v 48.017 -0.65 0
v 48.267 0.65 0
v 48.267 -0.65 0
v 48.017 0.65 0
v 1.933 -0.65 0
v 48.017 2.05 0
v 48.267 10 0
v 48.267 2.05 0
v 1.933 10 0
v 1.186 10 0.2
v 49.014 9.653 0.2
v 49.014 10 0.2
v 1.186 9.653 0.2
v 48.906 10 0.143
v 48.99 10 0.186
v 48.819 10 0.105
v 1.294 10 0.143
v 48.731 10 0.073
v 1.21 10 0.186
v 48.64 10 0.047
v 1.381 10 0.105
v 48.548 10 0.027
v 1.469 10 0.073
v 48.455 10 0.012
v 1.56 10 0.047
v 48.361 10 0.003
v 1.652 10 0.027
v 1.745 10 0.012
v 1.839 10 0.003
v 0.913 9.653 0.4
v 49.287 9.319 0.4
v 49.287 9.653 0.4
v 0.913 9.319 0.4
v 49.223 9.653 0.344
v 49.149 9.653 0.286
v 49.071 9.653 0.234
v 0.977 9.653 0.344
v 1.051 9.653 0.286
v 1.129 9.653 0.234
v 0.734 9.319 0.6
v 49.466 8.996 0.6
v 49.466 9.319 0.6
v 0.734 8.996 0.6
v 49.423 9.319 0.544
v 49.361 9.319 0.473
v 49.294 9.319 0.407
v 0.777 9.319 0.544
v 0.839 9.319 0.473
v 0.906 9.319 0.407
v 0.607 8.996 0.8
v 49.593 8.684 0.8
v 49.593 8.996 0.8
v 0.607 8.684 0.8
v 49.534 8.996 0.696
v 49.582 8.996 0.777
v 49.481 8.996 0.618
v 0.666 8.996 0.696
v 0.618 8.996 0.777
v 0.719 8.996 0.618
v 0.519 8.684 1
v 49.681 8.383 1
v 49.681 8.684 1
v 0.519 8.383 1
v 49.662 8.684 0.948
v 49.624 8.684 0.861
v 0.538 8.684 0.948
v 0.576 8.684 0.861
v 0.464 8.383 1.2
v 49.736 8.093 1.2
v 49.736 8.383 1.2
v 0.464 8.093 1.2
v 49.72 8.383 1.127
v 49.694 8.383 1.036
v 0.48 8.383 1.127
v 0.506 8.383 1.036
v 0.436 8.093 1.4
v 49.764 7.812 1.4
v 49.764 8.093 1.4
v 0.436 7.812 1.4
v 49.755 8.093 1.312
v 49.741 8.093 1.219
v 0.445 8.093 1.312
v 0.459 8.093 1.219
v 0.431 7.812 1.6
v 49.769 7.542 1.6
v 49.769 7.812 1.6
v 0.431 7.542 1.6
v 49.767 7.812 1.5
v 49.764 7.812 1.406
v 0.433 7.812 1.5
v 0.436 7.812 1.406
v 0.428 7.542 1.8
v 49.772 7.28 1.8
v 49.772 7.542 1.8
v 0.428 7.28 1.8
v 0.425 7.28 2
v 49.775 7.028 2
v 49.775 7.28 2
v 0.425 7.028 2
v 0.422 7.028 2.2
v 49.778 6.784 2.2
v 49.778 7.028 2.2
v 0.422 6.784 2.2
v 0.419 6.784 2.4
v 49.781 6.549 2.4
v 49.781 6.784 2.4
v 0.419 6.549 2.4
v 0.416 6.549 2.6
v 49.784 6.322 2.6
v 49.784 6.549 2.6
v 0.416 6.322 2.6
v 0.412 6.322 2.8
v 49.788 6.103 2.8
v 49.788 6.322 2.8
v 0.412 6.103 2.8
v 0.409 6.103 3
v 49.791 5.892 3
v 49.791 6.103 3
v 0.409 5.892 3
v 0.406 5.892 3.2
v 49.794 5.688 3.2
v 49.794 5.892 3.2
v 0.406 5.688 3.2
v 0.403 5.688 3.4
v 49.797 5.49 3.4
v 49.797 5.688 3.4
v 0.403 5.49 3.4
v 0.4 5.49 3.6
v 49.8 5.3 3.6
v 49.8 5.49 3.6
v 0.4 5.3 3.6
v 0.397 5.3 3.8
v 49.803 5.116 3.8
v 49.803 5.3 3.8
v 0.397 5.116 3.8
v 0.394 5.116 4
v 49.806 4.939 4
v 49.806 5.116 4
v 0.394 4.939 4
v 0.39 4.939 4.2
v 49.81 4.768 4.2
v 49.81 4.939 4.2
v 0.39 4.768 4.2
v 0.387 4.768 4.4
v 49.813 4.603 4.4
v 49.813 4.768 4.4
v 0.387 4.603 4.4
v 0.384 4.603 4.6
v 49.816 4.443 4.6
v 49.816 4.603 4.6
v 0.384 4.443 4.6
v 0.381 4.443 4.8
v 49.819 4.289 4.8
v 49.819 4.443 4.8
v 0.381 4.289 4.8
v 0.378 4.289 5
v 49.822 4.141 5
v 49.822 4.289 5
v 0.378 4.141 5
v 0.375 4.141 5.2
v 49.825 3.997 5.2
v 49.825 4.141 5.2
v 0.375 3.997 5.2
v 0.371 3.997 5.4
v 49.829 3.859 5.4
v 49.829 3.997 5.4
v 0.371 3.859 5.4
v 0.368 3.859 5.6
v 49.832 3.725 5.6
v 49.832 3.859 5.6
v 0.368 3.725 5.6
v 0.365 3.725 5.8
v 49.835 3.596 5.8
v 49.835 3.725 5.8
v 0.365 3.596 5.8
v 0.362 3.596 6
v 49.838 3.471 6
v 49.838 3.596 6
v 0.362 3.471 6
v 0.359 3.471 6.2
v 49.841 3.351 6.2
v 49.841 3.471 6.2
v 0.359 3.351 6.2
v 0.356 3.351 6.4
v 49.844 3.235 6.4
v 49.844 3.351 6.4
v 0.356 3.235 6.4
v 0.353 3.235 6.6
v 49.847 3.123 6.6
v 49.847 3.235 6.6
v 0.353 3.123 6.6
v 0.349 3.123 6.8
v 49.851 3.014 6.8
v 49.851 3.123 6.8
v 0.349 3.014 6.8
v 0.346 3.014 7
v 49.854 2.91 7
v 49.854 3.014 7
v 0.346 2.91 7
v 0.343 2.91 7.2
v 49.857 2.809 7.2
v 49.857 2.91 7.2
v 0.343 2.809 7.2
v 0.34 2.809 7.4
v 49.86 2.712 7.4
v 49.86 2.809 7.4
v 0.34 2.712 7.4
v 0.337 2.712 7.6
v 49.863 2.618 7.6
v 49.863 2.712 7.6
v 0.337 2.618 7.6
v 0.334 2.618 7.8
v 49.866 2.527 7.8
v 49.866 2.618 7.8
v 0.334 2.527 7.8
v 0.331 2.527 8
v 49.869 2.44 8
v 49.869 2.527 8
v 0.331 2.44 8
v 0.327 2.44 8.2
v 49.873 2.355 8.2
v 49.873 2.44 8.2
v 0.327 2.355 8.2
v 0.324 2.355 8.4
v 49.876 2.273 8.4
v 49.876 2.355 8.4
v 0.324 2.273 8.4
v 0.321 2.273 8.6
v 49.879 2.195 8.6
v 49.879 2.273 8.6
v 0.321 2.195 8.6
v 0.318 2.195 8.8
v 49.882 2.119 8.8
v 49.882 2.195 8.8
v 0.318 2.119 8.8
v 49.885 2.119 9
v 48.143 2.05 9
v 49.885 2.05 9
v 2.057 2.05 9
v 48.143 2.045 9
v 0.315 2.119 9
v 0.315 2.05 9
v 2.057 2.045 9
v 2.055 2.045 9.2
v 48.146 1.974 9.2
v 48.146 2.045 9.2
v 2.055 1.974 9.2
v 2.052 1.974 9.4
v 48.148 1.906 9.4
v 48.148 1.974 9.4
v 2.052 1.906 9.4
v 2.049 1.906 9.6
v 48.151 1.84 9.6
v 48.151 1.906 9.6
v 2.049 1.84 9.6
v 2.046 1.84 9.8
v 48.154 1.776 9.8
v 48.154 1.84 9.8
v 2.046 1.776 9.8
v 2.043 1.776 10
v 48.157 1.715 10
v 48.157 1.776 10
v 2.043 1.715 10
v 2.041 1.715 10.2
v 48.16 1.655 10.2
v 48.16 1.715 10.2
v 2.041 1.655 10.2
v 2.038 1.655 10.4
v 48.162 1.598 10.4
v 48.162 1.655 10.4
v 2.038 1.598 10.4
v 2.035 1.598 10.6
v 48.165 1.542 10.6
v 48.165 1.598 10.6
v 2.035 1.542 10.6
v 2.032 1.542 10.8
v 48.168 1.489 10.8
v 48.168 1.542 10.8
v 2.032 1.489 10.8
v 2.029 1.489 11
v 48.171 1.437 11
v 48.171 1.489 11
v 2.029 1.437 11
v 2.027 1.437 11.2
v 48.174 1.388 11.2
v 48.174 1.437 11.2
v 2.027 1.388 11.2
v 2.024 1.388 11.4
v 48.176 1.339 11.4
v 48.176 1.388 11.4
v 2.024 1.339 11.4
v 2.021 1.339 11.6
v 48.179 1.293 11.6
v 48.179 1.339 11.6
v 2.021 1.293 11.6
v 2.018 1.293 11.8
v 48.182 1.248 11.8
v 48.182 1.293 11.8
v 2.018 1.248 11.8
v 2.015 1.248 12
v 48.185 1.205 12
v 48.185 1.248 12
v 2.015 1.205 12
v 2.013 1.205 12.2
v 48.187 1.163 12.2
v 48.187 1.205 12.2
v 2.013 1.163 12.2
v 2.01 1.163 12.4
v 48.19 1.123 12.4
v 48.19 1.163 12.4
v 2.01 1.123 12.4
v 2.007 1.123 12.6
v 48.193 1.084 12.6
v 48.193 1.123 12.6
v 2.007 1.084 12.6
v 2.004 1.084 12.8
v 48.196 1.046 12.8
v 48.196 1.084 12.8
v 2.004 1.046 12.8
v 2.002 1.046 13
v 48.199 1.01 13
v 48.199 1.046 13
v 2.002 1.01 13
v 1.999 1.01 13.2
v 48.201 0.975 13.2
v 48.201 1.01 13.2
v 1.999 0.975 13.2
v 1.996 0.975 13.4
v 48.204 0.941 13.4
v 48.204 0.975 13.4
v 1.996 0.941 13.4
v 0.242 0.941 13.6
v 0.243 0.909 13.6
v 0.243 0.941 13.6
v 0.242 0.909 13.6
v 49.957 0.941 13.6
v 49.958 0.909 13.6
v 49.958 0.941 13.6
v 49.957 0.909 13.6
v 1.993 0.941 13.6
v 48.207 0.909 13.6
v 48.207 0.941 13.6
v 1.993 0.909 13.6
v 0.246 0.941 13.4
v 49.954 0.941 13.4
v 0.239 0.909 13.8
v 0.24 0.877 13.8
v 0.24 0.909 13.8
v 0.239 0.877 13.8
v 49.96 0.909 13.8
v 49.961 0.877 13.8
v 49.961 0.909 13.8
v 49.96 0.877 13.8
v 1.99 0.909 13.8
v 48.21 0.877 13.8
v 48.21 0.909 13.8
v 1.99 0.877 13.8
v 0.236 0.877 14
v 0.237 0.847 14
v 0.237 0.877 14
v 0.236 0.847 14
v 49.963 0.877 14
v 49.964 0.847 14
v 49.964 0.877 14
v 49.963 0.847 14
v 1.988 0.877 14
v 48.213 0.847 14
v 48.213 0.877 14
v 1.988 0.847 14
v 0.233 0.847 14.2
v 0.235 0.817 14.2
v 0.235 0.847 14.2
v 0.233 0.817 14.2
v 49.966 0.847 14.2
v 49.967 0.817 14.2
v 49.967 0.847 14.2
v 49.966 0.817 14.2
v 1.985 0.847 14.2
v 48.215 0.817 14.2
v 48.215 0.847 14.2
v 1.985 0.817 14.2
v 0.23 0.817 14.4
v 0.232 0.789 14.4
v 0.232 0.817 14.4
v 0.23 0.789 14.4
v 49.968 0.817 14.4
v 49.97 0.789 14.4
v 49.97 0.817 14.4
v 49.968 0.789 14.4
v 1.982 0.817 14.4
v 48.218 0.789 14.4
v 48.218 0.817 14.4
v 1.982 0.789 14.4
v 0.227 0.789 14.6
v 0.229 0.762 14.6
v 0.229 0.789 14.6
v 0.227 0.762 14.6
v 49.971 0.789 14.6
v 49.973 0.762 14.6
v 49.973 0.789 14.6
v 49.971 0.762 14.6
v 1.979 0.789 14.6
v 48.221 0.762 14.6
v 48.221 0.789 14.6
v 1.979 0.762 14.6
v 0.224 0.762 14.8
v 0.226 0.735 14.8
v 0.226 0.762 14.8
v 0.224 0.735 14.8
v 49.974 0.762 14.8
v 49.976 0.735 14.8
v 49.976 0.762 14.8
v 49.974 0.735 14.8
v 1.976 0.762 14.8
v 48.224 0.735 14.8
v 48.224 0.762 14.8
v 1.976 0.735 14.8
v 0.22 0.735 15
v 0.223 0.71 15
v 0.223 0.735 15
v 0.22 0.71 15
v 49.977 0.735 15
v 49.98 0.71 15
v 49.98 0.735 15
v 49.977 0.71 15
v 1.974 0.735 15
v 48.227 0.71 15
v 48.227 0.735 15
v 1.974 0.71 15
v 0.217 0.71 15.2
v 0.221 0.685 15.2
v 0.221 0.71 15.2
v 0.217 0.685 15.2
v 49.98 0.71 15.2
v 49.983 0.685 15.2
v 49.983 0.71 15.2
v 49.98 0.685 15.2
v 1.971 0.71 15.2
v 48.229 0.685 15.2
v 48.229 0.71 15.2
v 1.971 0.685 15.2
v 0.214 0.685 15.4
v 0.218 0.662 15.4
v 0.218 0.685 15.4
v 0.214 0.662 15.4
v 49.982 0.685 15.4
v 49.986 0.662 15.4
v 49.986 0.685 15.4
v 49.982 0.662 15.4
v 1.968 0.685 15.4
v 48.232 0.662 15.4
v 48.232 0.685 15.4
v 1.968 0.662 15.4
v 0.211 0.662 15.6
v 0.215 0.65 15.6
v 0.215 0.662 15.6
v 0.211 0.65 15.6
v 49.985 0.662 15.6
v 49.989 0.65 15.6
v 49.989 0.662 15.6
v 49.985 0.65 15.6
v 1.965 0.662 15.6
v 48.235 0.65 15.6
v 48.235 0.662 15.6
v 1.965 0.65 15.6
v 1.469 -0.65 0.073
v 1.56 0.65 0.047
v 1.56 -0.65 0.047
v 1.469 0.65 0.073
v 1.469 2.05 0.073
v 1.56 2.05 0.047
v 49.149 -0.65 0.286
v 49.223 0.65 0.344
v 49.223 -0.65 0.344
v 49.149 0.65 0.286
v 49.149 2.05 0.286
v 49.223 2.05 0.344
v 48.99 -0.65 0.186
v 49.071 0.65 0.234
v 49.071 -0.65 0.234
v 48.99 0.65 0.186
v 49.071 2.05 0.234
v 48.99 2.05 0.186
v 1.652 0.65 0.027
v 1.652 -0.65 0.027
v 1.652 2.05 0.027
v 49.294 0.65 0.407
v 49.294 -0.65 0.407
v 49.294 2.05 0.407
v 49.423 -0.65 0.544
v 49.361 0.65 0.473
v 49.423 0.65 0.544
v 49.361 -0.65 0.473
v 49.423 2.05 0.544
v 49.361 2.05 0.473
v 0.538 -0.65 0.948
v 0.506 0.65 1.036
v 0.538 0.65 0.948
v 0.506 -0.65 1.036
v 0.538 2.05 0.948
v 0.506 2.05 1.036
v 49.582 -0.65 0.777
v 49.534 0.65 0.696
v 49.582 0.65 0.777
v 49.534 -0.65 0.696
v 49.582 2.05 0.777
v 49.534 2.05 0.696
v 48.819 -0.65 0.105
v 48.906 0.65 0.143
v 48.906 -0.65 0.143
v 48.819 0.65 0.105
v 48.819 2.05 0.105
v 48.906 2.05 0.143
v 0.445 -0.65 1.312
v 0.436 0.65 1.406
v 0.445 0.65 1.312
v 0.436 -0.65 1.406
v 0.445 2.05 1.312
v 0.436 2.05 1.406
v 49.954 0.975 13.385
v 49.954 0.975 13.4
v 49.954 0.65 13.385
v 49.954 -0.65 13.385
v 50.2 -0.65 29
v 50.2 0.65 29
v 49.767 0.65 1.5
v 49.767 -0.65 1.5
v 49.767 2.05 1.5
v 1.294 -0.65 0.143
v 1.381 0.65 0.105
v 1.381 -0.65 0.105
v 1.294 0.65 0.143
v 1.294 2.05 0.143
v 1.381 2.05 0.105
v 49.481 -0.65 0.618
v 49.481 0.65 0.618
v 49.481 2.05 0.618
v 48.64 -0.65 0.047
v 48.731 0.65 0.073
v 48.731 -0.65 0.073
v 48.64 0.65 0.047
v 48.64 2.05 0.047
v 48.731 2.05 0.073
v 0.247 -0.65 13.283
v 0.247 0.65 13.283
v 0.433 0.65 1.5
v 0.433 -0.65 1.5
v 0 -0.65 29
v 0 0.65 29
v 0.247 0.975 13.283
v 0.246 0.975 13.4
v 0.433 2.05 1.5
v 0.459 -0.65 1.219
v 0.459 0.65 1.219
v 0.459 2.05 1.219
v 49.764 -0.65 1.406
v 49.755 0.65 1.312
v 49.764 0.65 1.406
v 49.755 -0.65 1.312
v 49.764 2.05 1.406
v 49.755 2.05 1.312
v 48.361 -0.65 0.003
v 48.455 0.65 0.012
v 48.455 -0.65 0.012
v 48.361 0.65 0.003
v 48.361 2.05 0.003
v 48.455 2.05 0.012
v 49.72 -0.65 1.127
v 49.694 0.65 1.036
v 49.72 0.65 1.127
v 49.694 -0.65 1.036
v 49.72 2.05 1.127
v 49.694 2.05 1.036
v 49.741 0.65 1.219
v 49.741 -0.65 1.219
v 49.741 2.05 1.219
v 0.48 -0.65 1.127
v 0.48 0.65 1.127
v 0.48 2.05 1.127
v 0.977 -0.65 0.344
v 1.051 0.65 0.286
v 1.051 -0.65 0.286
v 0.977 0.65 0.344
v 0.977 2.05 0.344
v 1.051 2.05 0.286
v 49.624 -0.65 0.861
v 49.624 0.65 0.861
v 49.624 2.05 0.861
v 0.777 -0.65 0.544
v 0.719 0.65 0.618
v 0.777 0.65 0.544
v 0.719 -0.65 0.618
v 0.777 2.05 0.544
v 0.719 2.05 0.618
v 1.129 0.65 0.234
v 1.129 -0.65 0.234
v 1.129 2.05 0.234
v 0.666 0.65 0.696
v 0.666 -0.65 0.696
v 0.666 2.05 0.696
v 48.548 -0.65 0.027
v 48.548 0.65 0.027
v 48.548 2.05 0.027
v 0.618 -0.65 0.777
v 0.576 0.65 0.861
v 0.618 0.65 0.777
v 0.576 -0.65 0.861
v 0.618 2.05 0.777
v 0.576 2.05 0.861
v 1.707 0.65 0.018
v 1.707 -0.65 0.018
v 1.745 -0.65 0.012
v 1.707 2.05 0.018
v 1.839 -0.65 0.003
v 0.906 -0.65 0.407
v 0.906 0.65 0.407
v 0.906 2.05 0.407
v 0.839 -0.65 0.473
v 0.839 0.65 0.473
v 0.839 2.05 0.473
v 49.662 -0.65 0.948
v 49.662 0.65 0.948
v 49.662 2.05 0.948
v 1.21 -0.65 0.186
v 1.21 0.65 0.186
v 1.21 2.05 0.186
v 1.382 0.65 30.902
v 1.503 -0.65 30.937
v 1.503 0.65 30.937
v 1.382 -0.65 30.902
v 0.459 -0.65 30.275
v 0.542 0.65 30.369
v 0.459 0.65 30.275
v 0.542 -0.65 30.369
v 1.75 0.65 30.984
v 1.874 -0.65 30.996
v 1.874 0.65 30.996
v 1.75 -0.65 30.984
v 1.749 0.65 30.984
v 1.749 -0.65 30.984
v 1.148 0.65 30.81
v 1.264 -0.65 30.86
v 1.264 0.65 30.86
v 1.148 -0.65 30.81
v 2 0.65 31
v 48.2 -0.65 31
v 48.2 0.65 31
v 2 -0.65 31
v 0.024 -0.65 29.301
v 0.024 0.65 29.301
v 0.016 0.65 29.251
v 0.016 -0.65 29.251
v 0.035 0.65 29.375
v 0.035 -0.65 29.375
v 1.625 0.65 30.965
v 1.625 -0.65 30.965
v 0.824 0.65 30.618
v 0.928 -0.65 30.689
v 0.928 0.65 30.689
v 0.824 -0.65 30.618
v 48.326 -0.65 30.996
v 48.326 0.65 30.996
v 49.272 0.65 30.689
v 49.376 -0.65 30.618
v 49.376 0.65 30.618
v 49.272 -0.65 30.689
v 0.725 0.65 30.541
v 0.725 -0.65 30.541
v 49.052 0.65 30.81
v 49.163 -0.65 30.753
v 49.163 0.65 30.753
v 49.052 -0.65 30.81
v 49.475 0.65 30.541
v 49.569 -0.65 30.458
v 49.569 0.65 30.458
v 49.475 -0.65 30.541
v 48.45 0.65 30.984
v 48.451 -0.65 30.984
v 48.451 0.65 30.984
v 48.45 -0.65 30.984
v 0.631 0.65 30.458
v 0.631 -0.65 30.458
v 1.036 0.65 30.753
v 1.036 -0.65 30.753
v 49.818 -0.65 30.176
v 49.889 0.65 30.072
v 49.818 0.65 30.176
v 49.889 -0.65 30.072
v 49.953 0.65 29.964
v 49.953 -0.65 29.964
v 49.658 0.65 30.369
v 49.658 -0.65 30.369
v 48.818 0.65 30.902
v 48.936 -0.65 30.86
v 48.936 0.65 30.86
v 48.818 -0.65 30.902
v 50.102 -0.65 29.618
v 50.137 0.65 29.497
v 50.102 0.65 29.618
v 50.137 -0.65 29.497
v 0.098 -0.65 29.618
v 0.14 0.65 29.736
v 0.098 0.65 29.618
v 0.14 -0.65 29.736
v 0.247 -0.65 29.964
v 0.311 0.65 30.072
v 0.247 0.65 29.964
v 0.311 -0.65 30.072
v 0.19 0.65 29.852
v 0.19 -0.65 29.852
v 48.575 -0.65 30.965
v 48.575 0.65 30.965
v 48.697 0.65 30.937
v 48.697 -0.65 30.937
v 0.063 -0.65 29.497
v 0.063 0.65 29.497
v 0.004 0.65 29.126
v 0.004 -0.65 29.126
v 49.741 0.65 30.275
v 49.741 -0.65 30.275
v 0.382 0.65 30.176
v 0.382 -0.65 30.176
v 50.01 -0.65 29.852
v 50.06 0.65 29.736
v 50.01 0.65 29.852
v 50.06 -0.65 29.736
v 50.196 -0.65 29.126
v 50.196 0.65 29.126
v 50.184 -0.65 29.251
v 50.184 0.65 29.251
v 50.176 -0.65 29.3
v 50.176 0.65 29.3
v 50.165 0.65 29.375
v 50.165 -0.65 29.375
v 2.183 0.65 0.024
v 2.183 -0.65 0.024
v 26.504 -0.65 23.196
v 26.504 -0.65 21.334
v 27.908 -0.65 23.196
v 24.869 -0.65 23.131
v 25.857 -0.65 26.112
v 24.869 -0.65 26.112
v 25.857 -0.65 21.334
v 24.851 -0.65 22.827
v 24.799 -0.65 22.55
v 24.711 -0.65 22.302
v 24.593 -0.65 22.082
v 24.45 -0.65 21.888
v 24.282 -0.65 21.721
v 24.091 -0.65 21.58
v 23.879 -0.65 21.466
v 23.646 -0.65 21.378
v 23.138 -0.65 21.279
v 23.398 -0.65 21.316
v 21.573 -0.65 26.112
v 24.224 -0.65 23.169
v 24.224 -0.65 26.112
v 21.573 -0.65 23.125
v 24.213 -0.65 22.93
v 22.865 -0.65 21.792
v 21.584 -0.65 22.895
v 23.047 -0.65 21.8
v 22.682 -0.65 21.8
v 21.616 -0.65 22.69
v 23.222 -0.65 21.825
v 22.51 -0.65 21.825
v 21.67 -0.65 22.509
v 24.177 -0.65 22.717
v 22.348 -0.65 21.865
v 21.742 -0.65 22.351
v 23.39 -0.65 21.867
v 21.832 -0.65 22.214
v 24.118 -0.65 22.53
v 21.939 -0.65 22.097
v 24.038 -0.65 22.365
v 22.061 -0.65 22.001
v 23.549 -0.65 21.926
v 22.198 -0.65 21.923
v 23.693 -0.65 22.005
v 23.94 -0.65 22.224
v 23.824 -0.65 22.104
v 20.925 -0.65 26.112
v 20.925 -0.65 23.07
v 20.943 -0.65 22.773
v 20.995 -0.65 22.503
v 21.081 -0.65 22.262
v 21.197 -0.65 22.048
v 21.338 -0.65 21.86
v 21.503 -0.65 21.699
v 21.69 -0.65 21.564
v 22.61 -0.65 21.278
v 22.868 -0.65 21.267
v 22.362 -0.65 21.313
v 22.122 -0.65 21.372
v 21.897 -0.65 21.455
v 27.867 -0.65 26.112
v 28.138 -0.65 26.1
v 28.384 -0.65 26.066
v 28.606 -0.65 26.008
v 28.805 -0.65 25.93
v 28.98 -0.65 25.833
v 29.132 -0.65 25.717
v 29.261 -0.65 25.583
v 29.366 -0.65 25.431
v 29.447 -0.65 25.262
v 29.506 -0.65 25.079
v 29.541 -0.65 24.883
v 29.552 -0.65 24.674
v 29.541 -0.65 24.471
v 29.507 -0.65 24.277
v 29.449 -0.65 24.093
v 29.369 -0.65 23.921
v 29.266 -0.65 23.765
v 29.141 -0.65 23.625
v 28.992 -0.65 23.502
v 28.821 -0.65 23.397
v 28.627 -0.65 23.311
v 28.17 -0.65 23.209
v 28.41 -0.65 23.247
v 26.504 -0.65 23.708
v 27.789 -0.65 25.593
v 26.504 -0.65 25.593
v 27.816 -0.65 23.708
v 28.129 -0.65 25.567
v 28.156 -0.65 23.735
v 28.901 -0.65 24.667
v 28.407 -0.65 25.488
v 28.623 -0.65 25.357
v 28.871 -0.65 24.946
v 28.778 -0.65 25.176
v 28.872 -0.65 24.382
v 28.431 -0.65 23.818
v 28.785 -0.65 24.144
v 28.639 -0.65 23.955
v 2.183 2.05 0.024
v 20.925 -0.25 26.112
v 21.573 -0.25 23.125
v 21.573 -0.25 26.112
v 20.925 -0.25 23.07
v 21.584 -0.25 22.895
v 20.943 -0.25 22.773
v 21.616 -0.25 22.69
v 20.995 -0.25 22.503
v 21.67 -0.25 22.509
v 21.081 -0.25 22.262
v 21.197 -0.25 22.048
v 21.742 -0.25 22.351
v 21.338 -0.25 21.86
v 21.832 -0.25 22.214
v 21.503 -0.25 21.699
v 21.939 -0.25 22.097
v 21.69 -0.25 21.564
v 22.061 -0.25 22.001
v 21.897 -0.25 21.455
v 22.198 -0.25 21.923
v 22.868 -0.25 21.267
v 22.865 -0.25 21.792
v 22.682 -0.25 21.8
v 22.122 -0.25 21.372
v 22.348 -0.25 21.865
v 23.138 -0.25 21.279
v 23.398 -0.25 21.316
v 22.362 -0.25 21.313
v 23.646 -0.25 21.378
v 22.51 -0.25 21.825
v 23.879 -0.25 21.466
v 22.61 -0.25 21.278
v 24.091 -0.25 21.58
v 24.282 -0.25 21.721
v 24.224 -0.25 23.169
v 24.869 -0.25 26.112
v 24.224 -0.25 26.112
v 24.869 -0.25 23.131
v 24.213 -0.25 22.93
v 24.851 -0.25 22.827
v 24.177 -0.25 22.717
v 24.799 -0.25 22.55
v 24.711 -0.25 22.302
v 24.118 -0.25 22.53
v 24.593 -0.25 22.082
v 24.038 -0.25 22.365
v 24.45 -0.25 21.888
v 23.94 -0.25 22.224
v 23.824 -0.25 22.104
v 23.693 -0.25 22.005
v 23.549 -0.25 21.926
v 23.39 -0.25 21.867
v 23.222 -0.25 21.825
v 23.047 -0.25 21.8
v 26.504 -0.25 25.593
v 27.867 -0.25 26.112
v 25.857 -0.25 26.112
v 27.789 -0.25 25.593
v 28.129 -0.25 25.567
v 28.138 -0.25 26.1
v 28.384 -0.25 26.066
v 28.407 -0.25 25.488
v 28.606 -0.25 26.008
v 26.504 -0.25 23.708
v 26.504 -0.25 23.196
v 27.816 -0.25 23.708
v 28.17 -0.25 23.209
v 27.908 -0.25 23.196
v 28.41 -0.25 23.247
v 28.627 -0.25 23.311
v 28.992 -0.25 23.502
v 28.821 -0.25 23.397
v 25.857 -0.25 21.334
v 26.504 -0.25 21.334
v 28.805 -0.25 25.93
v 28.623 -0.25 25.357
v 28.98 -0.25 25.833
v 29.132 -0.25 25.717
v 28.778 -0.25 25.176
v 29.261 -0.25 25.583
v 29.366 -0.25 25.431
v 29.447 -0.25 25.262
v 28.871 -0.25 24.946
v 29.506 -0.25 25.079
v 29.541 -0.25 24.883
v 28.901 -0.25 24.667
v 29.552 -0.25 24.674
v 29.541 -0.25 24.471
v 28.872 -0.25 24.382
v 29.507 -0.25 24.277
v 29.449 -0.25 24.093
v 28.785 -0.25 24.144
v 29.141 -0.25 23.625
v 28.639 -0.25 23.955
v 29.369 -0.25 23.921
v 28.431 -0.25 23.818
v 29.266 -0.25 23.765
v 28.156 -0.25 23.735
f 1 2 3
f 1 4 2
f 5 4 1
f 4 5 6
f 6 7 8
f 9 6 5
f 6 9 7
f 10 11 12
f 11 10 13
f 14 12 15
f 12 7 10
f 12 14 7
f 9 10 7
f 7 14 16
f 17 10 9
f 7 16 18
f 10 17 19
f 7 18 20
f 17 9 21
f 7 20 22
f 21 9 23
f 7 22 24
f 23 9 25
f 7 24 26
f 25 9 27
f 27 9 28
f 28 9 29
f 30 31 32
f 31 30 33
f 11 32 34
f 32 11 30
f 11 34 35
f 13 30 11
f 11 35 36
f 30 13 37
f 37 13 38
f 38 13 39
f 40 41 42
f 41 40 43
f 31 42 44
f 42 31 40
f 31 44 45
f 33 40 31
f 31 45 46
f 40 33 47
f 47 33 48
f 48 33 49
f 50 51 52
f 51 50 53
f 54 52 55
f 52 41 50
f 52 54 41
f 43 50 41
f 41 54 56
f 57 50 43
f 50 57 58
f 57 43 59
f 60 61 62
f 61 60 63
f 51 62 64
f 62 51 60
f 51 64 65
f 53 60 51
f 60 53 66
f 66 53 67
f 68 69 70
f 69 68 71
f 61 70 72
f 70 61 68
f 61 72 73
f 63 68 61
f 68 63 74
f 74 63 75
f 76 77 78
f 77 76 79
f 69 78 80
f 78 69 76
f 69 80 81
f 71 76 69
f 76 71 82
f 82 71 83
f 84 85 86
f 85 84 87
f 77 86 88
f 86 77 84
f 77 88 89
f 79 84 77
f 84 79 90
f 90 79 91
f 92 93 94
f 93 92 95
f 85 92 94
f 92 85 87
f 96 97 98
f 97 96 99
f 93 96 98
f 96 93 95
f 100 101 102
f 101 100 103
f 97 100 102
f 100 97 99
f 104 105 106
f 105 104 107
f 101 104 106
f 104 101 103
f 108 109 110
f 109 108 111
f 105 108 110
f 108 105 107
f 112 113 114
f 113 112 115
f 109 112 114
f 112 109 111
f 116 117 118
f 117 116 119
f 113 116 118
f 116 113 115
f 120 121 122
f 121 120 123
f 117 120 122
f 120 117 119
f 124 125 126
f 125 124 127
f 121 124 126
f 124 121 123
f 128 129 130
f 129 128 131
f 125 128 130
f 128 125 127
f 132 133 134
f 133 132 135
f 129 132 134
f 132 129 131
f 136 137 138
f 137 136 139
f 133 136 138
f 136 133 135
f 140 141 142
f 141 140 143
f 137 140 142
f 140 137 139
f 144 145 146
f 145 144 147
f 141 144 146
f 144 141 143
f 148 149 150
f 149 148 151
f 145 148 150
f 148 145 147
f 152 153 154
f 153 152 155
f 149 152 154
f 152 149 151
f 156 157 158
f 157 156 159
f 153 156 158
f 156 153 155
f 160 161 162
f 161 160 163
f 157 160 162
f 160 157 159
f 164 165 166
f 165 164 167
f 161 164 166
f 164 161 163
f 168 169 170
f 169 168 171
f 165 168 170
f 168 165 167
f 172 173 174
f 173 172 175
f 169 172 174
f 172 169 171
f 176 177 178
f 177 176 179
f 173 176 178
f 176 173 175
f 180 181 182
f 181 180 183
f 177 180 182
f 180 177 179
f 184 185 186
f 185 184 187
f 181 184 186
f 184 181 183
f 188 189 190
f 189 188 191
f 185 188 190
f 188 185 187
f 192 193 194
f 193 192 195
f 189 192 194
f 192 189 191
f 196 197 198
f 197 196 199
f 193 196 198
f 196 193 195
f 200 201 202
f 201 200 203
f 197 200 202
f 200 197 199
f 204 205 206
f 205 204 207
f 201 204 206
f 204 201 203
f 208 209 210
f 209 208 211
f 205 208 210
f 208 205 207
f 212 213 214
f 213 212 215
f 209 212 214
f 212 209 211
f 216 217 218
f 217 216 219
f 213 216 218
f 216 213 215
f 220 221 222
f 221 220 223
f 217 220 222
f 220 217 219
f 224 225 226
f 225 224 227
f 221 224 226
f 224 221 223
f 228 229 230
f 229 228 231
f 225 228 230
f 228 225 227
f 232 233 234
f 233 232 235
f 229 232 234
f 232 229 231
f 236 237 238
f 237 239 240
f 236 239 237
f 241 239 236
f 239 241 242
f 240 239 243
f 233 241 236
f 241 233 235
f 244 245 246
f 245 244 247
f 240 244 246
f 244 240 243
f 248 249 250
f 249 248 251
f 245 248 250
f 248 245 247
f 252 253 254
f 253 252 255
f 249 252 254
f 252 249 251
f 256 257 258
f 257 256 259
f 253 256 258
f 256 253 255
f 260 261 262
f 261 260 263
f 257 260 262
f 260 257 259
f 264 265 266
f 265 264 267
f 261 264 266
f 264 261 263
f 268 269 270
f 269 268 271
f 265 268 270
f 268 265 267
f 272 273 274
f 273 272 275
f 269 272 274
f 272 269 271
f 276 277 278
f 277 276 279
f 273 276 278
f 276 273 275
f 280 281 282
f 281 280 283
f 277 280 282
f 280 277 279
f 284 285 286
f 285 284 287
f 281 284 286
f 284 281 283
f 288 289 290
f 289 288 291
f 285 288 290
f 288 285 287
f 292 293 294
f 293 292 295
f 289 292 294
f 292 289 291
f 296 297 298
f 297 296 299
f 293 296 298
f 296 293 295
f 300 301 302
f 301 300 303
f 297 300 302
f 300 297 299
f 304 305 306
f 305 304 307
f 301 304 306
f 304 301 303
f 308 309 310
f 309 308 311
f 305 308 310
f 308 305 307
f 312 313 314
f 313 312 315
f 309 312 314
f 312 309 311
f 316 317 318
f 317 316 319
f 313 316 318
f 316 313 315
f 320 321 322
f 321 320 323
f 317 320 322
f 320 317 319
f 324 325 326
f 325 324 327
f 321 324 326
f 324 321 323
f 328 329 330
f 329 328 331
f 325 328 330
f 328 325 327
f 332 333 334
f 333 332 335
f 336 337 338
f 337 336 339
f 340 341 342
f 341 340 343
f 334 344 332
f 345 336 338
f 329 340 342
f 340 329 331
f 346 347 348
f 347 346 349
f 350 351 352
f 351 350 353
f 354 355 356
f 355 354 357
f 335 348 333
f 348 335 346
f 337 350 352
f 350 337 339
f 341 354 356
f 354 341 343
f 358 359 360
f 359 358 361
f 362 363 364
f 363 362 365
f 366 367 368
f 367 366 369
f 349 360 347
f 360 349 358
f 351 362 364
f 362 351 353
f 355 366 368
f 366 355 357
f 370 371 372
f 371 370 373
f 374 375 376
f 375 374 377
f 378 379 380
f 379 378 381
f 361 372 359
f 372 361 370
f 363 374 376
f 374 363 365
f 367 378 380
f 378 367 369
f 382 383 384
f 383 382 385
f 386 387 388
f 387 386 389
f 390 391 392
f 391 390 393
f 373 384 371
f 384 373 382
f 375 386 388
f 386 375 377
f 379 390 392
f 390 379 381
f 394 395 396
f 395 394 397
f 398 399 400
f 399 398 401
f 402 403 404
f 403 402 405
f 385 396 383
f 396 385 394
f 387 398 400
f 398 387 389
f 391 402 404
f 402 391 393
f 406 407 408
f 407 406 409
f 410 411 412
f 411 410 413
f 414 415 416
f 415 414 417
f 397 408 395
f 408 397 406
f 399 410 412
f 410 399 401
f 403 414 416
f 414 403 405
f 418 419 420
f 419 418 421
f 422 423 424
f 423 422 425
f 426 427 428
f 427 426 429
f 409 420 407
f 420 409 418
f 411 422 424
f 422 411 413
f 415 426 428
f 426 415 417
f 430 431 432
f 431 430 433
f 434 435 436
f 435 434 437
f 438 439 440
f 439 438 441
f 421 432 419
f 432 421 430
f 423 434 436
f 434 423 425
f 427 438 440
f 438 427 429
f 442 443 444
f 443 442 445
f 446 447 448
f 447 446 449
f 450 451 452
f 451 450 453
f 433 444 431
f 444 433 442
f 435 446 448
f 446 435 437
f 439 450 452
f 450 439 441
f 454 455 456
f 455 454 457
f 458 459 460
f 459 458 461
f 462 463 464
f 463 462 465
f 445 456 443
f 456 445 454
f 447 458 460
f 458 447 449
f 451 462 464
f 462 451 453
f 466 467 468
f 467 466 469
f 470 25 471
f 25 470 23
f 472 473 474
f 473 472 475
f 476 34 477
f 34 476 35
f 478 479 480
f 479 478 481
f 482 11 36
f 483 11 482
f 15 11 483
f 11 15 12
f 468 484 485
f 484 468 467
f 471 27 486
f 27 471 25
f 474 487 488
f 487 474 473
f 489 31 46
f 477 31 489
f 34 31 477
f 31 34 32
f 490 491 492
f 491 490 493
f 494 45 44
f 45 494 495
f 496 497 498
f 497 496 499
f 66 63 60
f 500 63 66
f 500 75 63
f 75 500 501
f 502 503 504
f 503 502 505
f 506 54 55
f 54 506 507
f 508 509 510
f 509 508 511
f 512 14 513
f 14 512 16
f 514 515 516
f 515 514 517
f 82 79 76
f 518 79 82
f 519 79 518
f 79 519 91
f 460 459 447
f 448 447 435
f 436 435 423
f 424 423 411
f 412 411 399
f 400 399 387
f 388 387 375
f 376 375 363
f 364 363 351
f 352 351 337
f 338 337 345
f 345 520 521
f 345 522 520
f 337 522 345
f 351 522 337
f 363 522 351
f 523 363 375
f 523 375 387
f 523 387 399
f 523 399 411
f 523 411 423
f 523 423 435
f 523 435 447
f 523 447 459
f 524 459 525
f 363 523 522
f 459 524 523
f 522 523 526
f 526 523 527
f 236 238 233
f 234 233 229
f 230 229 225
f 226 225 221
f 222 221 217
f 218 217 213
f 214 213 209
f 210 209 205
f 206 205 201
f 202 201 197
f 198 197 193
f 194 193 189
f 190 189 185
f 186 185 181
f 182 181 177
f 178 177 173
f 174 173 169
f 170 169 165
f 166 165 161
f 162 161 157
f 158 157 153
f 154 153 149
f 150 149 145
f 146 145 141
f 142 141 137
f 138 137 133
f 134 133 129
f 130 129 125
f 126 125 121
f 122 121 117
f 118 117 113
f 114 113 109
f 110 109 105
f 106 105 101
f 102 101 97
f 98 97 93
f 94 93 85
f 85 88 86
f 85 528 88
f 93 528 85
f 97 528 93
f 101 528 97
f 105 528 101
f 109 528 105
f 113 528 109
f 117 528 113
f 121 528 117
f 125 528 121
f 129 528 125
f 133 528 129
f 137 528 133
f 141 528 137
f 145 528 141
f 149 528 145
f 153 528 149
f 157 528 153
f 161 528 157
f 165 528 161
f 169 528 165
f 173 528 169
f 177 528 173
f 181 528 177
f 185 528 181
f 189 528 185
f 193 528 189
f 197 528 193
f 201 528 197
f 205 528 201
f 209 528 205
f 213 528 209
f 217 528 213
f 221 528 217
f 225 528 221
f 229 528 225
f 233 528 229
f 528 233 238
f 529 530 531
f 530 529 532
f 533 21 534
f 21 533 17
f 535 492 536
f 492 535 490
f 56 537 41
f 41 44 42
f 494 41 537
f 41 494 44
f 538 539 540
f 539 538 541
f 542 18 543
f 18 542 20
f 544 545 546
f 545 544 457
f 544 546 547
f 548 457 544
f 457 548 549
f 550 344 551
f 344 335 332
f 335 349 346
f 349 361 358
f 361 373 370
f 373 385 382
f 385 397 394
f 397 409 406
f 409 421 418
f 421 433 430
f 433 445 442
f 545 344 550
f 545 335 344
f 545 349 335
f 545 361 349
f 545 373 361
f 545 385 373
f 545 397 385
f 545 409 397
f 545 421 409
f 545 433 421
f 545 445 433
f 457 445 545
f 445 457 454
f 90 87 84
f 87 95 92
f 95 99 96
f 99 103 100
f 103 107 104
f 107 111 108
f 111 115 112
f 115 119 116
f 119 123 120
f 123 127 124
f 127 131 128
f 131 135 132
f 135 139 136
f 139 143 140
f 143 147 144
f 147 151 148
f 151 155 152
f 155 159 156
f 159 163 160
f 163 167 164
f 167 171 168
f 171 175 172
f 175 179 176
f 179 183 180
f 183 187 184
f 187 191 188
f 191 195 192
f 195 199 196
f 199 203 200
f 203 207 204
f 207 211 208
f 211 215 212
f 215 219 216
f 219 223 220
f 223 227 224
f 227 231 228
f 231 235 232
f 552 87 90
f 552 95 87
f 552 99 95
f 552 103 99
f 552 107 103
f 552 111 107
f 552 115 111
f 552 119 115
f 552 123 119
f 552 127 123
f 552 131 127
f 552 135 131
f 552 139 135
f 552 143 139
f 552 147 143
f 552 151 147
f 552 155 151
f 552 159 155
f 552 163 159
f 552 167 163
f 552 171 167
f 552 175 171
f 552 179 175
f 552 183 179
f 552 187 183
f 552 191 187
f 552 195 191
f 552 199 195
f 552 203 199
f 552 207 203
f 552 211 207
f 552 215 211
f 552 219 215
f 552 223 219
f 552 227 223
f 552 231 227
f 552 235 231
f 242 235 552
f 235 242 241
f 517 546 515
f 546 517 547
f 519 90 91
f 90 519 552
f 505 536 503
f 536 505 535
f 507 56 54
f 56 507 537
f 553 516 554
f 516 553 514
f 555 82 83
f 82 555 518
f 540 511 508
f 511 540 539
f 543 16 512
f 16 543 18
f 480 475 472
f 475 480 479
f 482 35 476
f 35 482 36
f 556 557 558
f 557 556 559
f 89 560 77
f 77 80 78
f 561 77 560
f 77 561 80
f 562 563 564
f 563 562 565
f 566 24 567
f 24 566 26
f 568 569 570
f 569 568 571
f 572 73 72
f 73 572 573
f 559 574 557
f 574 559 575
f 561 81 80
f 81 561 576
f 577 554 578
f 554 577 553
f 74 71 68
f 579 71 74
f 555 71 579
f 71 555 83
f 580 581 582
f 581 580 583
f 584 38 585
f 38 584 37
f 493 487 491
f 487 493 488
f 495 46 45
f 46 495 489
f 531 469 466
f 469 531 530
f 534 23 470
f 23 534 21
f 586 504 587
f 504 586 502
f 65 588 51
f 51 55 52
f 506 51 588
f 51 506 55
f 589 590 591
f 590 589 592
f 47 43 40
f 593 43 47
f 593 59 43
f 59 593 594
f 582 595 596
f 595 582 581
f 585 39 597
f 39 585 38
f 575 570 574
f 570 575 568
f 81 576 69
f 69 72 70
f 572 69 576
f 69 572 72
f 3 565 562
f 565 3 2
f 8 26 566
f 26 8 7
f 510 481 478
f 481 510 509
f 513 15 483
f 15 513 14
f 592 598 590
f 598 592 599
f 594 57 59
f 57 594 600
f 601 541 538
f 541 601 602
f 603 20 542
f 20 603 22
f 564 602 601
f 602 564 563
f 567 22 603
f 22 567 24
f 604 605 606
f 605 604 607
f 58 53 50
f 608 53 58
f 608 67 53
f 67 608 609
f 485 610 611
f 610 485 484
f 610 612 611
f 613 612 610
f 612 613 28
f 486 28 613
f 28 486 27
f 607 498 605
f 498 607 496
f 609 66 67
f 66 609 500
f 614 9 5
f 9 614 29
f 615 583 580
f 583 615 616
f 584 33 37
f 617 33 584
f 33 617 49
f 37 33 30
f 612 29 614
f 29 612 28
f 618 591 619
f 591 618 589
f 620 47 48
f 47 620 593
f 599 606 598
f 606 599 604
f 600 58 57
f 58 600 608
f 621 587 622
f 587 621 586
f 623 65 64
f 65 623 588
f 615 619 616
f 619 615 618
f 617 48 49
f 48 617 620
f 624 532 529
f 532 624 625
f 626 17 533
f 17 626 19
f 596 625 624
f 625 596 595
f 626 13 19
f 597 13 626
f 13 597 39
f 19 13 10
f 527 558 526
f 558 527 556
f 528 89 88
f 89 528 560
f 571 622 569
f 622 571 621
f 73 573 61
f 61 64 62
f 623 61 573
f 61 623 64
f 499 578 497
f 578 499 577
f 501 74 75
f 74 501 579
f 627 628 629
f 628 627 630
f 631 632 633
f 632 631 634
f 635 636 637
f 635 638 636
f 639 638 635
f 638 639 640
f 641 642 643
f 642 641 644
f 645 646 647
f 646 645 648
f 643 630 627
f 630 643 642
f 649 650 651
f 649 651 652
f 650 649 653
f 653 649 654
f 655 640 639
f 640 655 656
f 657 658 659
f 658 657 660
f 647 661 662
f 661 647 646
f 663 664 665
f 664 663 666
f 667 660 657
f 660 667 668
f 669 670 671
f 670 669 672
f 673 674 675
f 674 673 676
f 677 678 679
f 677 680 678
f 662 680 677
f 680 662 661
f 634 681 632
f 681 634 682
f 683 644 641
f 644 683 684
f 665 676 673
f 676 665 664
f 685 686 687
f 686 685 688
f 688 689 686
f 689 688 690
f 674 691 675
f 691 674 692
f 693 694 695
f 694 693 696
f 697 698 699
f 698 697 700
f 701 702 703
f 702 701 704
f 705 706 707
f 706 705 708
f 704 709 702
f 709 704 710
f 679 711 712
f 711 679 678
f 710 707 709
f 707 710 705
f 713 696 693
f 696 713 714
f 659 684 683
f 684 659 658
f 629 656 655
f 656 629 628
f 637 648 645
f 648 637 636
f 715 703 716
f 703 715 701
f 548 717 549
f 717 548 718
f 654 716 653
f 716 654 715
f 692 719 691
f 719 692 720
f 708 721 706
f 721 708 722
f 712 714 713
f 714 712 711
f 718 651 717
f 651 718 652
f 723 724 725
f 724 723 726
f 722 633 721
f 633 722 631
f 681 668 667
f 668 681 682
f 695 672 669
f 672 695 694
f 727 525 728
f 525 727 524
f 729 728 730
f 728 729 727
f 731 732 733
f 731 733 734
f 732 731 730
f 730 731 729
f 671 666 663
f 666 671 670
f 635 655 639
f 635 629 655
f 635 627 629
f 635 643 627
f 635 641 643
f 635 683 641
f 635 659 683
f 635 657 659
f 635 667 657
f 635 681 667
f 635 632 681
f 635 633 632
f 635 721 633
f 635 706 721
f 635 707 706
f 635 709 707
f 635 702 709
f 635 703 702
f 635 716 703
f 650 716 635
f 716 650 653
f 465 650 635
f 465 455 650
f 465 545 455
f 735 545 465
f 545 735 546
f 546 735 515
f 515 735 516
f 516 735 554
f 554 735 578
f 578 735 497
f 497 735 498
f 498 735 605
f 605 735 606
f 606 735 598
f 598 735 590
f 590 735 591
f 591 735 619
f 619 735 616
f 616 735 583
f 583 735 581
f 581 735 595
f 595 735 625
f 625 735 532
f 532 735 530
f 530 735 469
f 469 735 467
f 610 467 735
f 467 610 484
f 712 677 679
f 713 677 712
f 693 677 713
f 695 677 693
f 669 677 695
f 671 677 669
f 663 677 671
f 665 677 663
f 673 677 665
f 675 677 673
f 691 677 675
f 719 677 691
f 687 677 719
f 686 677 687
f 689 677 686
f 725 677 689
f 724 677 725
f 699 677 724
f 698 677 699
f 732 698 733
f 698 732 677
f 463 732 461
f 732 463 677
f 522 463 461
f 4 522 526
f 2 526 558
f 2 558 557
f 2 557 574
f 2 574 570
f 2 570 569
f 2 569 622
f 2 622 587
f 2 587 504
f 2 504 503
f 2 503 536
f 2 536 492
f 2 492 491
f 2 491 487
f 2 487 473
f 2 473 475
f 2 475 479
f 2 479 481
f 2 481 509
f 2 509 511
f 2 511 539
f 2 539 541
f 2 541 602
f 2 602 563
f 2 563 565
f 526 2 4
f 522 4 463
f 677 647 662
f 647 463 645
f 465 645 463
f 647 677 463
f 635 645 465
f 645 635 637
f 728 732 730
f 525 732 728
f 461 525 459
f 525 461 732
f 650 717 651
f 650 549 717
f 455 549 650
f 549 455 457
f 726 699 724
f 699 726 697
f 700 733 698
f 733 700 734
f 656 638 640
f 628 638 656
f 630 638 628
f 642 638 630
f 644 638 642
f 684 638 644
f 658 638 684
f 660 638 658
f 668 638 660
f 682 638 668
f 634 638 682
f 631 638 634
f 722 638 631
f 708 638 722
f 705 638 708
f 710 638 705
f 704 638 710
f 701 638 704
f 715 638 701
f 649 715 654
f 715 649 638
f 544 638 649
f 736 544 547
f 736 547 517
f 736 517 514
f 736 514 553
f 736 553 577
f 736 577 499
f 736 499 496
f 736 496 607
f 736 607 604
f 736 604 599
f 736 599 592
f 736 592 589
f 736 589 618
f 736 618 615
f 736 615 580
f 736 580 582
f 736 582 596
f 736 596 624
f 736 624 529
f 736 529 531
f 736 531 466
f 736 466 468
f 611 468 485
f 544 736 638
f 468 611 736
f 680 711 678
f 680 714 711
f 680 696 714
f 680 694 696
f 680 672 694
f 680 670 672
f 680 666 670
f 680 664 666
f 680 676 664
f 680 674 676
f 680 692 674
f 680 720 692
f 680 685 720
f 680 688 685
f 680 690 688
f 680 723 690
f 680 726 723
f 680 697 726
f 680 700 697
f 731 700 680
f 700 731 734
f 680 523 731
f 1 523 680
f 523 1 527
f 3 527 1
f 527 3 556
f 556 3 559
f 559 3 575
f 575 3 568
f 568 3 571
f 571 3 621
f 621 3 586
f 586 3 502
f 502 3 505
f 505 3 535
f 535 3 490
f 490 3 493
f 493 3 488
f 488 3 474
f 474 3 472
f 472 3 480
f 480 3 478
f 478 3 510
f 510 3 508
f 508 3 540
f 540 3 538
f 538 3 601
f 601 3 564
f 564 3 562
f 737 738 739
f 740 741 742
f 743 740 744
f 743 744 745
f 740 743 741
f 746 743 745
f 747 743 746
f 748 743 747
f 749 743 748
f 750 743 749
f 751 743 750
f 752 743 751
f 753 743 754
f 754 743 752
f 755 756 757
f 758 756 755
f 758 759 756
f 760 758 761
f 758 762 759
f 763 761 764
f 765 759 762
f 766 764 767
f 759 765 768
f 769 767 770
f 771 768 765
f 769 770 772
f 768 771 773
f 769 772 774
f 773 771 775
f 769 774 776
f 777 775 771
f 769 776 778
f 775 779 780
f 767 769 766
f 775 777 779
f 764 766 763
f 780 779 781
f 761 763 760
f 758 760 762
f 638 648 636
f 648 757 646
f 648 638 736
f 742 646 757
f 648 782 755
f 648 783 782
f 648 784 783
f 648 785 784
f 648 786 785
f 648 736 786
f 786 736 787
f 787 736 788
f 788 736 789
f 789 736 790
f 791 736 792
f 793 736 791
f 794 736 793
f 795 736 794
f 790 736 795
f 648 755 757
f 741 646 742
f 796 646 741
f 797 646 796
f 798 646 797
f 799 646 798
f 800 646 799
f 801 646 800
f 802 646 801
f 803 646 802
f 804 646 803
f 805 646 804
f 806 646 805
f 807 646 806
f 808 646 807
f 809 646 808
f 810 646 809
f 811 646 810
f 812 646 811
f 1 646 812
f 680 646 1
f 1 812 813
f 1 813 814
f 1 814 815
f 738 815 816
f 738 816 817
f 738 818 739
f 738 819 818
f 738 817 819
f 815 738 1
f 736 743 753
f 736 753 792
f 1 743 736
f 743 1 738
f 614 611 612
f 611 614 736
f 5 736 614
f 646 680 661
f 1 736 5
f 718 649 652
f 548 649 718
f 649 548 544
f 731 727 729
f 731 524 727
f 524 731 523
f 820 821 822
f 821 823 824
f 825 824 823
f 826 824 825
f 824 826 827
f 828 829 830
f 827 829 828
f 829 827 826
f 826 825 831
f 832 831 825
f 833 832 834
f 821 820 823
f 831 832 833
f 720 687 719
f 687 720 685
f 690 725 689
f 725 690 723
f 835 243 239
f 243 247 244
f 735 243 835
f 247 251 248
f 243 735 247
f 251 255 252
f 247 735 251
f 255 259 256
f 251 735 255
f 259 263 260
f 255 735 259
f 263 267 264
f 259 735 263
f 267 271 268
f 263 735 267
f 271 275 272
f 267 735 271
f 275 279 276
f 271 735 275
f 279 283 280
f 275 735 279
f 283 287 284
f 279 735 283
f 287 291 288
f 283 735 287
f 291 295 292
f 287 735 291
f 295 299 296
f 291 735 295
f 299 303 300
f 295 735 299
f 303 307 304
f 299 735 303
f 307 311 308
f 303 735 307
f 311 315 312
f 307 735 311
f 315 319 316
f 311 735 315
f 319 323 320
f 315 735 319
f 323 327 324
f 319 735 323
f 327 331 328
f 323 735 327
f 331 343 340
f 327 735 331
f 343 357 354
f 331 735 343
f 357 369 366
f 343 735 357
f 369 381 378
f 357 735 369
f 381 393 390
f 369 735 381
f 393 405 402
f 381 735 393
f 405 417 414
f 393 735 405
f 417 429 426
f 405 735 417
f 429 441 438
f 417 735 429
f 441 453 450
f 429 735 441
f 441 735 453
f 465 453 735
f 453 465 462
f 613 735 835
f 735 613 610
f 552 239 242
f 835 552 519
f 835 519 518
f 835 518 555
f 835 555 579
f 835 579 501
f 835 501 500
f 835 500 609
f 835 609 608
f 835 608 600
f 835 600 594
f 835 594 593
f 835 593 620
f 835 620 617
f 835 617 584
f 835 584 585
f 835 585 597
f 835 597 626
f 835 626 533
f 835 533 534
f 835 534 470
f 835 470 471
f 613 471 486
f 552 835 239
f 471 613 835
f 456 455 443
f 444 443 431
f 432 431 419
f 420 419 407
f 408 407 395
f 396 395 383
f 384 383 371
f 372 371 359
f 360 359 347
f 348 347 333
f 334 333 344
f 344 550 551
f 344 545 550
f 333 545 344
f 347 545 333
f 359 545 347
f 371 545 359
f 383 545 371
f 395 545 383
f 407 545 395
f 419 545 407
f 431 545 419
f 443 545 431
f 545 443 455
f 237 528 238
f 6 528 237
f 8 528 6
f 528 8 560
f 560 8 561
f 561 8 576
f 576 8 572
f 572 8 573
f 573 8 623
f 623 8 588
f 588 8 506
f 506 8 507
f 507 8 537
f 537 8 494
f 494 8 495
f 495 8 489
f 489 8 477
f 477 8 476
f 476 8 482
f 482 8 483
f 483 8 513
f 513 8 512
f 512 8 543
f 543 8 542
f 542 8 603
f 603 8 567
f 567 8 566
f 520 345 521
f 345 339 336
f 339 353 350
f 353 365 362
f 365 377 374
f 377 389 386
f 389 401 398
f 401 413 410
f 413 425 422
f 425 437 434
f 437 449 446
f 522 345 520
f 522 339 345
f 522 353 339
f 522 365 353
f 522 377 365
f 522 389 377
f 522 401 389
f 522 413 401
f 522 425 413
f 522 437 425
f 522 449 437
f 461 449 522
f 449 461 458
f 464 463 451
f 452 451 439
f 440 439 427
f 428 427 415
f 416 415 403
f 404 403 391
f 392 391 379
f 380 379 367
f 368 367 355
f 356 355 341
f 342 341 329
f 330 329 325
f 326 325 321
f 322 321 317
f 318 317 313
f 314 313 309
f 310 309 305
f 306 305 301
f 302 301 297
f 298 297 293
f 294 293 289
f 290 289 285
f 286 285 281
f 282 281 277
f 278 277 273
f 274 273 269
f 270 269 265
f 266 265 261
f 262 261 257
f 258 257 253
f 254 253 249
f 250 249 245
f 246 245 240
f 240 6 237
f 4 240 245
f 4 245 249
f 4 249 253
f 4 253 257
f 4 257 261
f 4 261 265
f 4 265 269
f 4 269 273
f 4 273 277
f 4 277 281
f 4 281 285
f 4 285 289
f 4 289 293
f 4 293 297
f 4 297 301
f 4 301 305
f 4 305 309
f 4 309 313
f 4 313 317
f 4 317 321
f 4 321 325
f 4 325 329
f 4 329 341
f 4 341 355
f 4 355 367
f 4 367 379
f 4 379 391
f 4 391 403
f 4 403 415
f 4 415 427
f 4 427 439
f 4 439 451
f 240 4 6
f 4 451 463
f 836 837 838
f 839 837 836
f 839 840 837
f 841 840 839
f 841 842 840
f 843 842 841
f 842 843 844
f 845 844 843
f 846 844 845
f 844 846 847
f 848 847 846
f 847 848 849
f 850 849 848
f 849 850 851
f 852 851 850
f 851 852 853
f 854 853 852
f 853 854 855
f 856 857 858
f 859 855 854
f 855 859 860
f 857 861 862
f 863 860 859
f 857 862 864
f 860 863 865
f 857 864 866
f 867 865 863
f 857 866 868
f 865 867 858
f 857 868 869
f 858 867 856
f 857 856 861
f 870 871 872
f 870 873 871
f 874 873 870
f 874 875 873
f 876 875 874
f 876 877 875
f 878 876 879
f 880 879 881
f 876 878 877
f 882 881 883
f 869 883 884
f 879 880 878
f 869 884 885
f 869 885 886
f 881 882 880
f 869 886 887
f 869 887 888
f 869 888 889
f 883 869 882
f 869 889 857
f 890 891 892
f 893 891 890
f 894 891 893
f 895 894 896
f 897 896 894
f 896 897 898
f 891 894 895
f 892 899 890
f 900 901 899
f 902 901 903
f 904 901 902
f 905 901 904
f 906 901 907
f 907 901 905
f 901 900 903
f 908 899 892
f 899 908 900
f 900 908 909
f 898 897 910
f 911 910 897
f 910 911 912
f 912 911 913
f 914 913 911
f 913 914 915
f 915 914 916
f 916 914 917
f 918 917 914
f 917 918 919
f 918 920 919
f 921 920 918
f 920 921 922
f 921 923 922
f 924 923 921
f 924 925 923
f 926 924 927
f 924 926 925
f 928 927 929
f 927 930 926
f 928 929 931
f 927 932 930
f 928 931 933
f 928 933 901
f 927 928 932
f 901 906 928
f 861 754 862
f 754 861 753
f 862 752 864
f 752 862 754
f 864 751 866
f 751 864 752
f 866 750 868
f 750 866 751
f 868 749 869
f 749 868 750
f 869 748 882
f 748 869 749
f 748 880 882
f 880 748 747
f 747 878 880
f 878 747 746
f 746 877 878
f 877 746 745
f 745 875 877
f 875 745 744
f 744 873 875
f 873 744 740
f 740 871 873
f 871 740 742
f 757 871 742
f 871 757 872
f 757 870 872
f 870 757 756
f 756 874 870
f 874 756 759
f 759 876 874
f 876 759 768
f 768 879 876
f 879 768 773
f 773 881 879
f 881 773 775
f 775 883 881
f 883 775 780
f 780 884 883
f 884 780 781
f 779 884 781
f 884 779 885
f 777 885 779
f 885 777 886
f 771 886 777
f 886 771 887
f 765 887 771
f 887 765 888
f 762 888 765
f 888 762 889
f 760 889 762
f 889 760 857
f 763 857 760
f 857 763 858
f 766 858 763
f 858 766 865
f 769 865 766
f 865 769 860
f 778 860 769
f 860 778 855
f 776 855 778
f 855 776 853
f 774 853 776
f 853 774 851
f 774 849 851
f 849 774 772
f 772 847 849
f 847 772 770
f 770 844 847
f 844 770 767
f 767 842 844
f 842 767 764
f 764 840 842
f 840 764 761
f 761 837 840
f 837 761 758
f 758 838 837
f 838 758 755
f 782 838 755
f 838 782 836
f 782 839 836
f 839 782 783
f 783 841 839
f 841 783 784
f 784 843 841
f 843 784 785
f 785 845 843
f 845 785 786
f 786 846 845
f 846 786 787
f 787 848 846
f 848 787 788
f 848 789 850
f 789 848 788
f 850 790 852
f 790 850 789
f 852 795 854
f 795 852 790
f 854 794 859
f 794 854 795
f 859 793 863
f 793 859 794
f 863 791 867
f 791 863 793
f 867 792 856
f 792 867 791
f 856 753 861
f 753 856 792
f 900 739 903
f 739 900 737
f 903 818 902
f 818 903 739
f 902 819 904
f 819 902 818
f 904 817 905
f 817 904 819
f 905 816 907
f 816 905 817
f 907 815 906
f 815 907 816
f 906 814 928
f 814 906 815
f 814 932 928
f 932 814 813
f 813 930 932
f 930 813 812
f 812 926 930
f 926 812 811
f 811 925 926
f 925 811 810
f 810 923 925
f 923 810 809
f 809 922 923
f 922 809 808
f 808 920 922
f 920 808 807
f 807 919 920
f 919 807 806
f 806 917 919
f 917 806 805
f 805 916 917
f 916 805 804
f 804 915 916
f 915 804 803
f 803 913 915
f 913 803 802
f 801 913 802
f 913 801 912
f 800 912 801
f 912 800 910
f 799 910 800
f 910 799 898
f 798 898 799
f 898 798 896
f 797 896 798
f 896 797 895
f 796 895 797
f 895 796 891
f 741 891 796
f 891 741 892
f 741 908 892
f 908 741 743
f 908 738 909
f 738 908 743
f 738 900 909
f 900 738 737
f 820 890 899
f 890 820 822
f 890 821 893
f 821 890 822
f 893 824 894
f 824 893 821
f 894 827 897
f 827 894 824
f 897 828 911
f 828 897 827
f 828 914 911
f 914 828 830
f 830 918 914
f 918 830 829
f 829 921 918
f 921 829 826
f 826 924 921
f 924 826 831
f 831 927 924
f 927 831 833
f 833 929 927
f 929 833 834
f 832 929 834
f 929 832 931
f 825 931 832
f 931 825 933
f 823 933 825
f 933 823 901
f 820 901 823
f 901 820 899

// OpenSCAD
// raacoDrawerDividers.scad

// Design: Jon Sagebrand
// jonsagebrand@gmail.com

// raaco

// Drawer dividers for:
// Drawer 150-00, 108980, Dimensions (H x W x D): 41 x 55 x 153 mm
// Drawer 150-01, 104692, Dimensions (H x W x D): 41 x 67 x 153 mm
// Drawer 150-02, 104715, Dimensions (H x W x D): 64 x 91 x 154 mm
// Drawer 150-03, 104708, Dimensions (H x W x D): 64 x 279 x 155 mm
// Drawer 150-04, 109178, Dimensions (H x W x D): 64 x 139 x 155 mm
// Drawer 250-01, 107273, Dimensions (H x W x D): 58 x 80 x 239 mm
// Drawer 250-02, 107259, Dimensions (H x W x D): 92 x 159 x 239 

// Not for:
// Drawer 250-03, 103114, Dimensions (H x W x D): 57 x 320 x 240 mm
// at the moment

// 0: Custom
// 1: Marked 35/52, Divider 150-00, 101981, Dimensions: 50/51 x 31 mm
// 2: Marked 57/87, Divider 150-02, 102032, Dimensions: 84,5/85,5 x 49 mm
// 3: Marked 57/135, Divider 150-03/04, 102049, Dimensions: 132/133,5 x 50 mm
// 4: Marked 35/?, Divider 150-01 large, 111386, Dimensions: 137 x 31 mm
// 5: Marked 35/?, Divider 150-01 medium, 101998, Dimensions: 62/63 x 31 mm
// 6: Marked 35/?, Divider 150-01 small, 111393, Dimensions: 32 x 31 mm 
// 7: Marked ?, Divider 250-01, 106757, Dimensions: 75 x 46 mm
// 8: Marked ?, Divider 250-02, 106764, Dimensions: 154 x 80 mm
dividerType = 1;

// slopes
// 0: no slopes
// 1: backside sloped
// 2: both sides sloped
slopeType = 1;

layerHeight = 0.2; // set this to your slicer's layer height, not essential, only used for a smooth slope
overExtrusionCompensation = 0.15;  // compensate for over extrusion

// text on the upper front
enableText = true;
myText = "UP";

///// custom type configuration
customWidth = 100; // if you set 'dividerType' to '0' above, these values are used
customHeight = 50;
customAngle = 3;
customTopRadius = 1.5;
customBottomRadius = 2;
customThickness = 1.8;
///// end of custom type

// text configuration
textFont = "Liberation Sans";
textSize = 5;

textDistFromTop = 5;
textDepth = 0.4;

///// here starts the configuration, most things are fine as they are

// slope configuration
slopeDepth = 10;
slopeHeight = 50; // percentage of the total height

// frame for divider
frameProtrusion = 1.6; // how much the frame sticks out from the drawers side
frameDepth = 1.1; // how deep is each protrusion


///// no editing below this line
height1 = 31;
height2 = 49;
height3 = 50;
height4 = 31;
height5 = 31;
height6 = 31;
height7 = 46;
height8 = 80;

height = dividerType == 0 ? customHeight :
  (dividerType == 1 ? height1 :
   (dividerType == 2 ? height2 :
    (dividerType == 3 ? height3 :
     (dividerType == 4 ? height4 :
      (dividerType == 5 ? height5 :
       (dividerType == 6 ? height6 :
	(dividerType == 7 ? height7 :
	 (dividerType == 8 ? height8 :
	  0))))))));

widthCompensation = -overExtrusionCompensation * 2;

width1 = 50.5;
width2 = 85;
width3 = 132.5;
width4 = 137;
width5 = 62.5;
width6 = 32;
width7 = 75;
width8 = 154;

width = dividerType ==	0 ? customWidth :
  (dividerType == 1 ? width1 + widthCompensation :
   (dividerType == 2 ? width2 + widthCompensation : 
    (dividerType == 3 ? width3 + widthCompensation :
     (dividerType == 4 ? width4 + widthCompensation :
      (dividerType == 5 ? width5 + widthCompensation :
       (dividerType == 6 ? width6 + widthCompensation :
	(dividerType == 7 ? width7 + widthCompensation :
	 (dividerType == 8 ? width8 + widthCompensation :
	  0))))))));

defaultThickness = 1.6;
defaultAngle = 0.8;
defaultBottomRadius = 1.5;
defaultTopRadius = 2;

thicknessCompensation = -overExtrusionCompensation * 2; // compensate for over extrusion

thickness = dividerType ==  0 ? customThickness : defaultThickness + thicknessCompensation;
angle = dividerType ==  0 ? customAngle : defaultAngle;
bottomRadius = dividerType ==  0 ? customBottomRadius : defaultBottomRadius;
topRadius = dividerType ==  0 ? customTopRadius : defaultTopRadius;

bottomInset = height * tan(angle);

frameXCompensation = overExtrusionCompensation; // compensate for over extrusion
frameYCompensation = overExtrusionCompensation * 2; // compensate for over extrusion
frameX = frameProtrusion + frameXCompensation;
frameY = frameDepth + frameYCompensation;

roundness = 100;

///// start to draw
echo("Width: ", width);
echo("Height: ", height);
echo("Thickness: ", thickness);

difference() {
  union() {
    if (!slopeType) { // draw divider laying flat
      drawPolygon(thickness);
    } else {

      difference() {
	union() {
	  intersection() { // make divider and slopes, with angles
	    translate([0, slopeDepth, 0])
	      rotate([90, 0, 0])
	      drawPolygon(slopeDepth * 2);
	    slopes();
	  }
	  translate([0, thickness / 2, 0]) // make divider again, as the top part was deleted
	    rotate([90, 0, 0])
	    drawPolygon(thickness);
	}
 
	// delete frame
	if (slopeType) {
	  frames();
	}
      }     
    }
  }

if (enableText && (slopeType)) {
  rotate([90, 0, 0])
    translate([0, 0, -thickness / 2])
    drawText();
 } else if (enableText) {
  drawText();
 }
}
module drawPolygon(polygonExtrude) {
  
  linear_extrude(height = polygonExtrude)
  union() {
  color("lightgreen")
    polygon(points = [[bottomInset + bottomRadius, 0], 
		      [width - bottomInset - bottomRadius, 0], 
		      [width - bottomInset, bottomRadius], 
		      [width, height - topRadius], 
		      [width - topRadius, height],
		      [topRadius, height],
		      [0, height - topRadius],
		      [bottomInset, bottomRadius]]);

  translate([bottomRadius + bottomInset, bottomRadius, 0])
    color("red")
    circle(r = bottomRadius, $fn = roundness);

  translate([width - bottomRadius - bottomInset, bottomRadius, 0])
    color("red")
    circle(r = bottomRadius, $fn = roundness);

  translate([width - topRadius, height - topRadius, 0])
    color("red")
    circle(r = topRadius, $fn = roundness);

  translate([topRadius, height - topRadius, 0])
    color("red")
    circle(r = topRadius, $fn = roundness);
  }
}

module drawText() {

  recess = slopeType == 0 ? textDepth : slopeDepth;
  translate([width / 2, height - textDistFromTop, thickness - textDepth])
    linear_extrude(height = recess)
    text(text = str(myText), font = textFont, size = textSize, halign = "center", valign = "top");
  
}

module slopes() {
  steps = height * slopeHeight / 100 / layerHeight;
  echo("Steps: ", steps);

  // exponential decay formula:
  // y = a * pow(k, t)
  //
  // y, final amount remaining after the decay over a period of time
  // a, the original amount
  // k, decay factor, where b is percent change in decimal, ie 2(%), 3(%) e
  // t, time
  //
  // k = pow(y / a, 1 / t)
  //
  // this translates to:
  // y <=> stepDepth
  // a <=> slopeDepth
  // t <=> stepNo
  //
  // stepDepth = slopeDepth * pow(k, stepNo)
  //
  // so we have to calculate k, when stepDepth is half ofthickness and stepNo is maximum (steps):
  
  k = pow((thickness / 2) / slopeDepth, 1 / steps);
  //k = (pow(thickness / 2 / slopeDepth, 1 / steps) + 2.1) / 100;
  
  echo("Decay: ", k);

  difference() {

    
    for (slopeStep = [0 : layerHeight : height * slopeHeight / 100]) {
 
      stepWidth = width;

      stepDepth = slopeDepth * pow(k, slopeStep / layerHeight); 
            
      // echo("Step: ", slopeStep / layerHeight, ", CurrentHeight: ", slopeStep, "Depth: ", stepDepth);
      
      translate([0, 0, slopeStep])
	color("lightgrey")
	linear_extrude(height = layerHeight)
	square(size = [stepWidth, stepDepth]);

      if (slopeType == 2) {
	translate([0, -stepDepth, slopeStep])
	  color("lightgreen")
	  linear_extrude(height = layerHeight)
	  square(size = [stepWidth, stepDepth]);
      }
    }

  }

  //echo(exp(ln(2) * 4)); // 2 to the power of 4
}

module frames() {
  for (y = [0 : 1 : 1]) {
    translate([bottomInset, -frameY - thickness / 2 + y * (thickness + frameY), 0])
      rotate([0, -angle, 0])
      color("red")
      cube([frameX, frameY, height]);
  }

  for (y = [0 : 1 : 1]) {
    translate([width - frameX - bottomInset, -frameY - thickness / 2 + y * (thickness + frameY), 0])
      rotate([0, angle, 0])
      color("blue")
      cube([frameX, frameY, height]);
  }
}
